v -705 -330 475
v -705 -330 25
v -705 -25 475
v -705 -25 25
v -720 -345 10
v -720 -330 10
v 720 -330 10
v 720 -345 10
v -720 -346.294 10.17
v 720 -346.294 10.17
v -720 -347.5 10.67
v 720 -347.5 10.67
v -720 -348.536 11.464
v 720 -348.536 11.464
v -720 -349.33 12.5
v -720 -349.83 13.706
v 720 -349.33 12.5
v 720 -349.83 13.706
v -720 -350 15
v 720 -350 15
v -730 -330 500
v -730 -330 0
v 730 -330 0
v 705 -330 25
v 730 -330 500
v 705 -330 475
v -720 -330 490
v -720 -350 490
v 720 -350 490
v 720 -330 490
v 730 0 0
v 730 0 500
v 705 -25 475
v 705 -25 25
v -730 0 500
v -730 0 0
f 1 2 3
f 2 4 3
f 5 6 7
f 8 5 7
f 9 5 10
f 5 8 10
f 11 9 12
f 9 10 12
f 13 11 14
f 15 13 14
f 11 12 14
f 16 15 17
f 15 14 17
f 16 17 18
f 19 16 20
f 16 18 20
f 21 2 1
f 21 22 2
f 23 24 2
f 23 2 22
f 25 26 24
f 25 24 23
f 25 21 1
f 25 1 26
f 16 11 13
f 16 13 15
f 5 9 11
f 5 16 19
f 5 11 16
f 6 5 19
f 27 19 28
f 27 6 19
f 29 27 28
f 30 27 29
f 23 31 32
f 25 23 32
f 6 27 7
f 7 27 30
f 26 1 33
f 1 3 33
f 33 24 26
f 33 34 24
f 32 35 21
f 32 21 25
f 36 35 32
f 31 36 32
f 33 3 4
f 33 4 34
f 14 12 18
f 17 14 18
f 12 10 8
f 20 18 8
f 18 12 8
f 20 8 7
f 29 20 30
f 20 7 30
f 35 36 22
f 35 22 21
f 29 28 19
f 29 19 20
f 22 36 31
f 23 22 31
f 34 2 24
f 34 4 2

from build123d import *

# Parameters (mm, degrees)
F0_W     = 1460
F0_H     = 500
F1_DEPTH = 330
F2_T     = -25
F3_W     = 1440
F3_H     = 480
F4_DEPTH = 20
F5_R     = 5


# Not quite as in the source:
# - a feature names something its author has since deleted; it is built from what else it names


with BuildPart() as f1:
    # F0 (on Front) → F1 (new body)
    with BuildSketch(Plane.XZ):
        with Locations((0, 250)):
            Rectangle(F0_W, F0_H)
    extrude(amount=F1_DEPTH)

    # F2
    f2_openings = [f1.faces().sort_by_distance(p)[0] for p in [
        (0, -330, 250),
    ]]
    offset(amount=F2_T, openings=f2_openings)


with BuildPart() as f4:
    # F3 (on face) → F4 (new body)
    with BuildSketch(Plane.XZ.offset(330)):
        with Locations((0, 250)):
            Rectangle(F3_W, F3_H)
    extrude(amount=F4_DEPTH)

    # F5
    f5_edges = [f4.edges().sort_by_distance(p)[0] for p in [
        (0, -350, 10),
    ]]
    fillet(f5_edges, radius=F5_R)


solid = Compound([f1.part, f4.part])
